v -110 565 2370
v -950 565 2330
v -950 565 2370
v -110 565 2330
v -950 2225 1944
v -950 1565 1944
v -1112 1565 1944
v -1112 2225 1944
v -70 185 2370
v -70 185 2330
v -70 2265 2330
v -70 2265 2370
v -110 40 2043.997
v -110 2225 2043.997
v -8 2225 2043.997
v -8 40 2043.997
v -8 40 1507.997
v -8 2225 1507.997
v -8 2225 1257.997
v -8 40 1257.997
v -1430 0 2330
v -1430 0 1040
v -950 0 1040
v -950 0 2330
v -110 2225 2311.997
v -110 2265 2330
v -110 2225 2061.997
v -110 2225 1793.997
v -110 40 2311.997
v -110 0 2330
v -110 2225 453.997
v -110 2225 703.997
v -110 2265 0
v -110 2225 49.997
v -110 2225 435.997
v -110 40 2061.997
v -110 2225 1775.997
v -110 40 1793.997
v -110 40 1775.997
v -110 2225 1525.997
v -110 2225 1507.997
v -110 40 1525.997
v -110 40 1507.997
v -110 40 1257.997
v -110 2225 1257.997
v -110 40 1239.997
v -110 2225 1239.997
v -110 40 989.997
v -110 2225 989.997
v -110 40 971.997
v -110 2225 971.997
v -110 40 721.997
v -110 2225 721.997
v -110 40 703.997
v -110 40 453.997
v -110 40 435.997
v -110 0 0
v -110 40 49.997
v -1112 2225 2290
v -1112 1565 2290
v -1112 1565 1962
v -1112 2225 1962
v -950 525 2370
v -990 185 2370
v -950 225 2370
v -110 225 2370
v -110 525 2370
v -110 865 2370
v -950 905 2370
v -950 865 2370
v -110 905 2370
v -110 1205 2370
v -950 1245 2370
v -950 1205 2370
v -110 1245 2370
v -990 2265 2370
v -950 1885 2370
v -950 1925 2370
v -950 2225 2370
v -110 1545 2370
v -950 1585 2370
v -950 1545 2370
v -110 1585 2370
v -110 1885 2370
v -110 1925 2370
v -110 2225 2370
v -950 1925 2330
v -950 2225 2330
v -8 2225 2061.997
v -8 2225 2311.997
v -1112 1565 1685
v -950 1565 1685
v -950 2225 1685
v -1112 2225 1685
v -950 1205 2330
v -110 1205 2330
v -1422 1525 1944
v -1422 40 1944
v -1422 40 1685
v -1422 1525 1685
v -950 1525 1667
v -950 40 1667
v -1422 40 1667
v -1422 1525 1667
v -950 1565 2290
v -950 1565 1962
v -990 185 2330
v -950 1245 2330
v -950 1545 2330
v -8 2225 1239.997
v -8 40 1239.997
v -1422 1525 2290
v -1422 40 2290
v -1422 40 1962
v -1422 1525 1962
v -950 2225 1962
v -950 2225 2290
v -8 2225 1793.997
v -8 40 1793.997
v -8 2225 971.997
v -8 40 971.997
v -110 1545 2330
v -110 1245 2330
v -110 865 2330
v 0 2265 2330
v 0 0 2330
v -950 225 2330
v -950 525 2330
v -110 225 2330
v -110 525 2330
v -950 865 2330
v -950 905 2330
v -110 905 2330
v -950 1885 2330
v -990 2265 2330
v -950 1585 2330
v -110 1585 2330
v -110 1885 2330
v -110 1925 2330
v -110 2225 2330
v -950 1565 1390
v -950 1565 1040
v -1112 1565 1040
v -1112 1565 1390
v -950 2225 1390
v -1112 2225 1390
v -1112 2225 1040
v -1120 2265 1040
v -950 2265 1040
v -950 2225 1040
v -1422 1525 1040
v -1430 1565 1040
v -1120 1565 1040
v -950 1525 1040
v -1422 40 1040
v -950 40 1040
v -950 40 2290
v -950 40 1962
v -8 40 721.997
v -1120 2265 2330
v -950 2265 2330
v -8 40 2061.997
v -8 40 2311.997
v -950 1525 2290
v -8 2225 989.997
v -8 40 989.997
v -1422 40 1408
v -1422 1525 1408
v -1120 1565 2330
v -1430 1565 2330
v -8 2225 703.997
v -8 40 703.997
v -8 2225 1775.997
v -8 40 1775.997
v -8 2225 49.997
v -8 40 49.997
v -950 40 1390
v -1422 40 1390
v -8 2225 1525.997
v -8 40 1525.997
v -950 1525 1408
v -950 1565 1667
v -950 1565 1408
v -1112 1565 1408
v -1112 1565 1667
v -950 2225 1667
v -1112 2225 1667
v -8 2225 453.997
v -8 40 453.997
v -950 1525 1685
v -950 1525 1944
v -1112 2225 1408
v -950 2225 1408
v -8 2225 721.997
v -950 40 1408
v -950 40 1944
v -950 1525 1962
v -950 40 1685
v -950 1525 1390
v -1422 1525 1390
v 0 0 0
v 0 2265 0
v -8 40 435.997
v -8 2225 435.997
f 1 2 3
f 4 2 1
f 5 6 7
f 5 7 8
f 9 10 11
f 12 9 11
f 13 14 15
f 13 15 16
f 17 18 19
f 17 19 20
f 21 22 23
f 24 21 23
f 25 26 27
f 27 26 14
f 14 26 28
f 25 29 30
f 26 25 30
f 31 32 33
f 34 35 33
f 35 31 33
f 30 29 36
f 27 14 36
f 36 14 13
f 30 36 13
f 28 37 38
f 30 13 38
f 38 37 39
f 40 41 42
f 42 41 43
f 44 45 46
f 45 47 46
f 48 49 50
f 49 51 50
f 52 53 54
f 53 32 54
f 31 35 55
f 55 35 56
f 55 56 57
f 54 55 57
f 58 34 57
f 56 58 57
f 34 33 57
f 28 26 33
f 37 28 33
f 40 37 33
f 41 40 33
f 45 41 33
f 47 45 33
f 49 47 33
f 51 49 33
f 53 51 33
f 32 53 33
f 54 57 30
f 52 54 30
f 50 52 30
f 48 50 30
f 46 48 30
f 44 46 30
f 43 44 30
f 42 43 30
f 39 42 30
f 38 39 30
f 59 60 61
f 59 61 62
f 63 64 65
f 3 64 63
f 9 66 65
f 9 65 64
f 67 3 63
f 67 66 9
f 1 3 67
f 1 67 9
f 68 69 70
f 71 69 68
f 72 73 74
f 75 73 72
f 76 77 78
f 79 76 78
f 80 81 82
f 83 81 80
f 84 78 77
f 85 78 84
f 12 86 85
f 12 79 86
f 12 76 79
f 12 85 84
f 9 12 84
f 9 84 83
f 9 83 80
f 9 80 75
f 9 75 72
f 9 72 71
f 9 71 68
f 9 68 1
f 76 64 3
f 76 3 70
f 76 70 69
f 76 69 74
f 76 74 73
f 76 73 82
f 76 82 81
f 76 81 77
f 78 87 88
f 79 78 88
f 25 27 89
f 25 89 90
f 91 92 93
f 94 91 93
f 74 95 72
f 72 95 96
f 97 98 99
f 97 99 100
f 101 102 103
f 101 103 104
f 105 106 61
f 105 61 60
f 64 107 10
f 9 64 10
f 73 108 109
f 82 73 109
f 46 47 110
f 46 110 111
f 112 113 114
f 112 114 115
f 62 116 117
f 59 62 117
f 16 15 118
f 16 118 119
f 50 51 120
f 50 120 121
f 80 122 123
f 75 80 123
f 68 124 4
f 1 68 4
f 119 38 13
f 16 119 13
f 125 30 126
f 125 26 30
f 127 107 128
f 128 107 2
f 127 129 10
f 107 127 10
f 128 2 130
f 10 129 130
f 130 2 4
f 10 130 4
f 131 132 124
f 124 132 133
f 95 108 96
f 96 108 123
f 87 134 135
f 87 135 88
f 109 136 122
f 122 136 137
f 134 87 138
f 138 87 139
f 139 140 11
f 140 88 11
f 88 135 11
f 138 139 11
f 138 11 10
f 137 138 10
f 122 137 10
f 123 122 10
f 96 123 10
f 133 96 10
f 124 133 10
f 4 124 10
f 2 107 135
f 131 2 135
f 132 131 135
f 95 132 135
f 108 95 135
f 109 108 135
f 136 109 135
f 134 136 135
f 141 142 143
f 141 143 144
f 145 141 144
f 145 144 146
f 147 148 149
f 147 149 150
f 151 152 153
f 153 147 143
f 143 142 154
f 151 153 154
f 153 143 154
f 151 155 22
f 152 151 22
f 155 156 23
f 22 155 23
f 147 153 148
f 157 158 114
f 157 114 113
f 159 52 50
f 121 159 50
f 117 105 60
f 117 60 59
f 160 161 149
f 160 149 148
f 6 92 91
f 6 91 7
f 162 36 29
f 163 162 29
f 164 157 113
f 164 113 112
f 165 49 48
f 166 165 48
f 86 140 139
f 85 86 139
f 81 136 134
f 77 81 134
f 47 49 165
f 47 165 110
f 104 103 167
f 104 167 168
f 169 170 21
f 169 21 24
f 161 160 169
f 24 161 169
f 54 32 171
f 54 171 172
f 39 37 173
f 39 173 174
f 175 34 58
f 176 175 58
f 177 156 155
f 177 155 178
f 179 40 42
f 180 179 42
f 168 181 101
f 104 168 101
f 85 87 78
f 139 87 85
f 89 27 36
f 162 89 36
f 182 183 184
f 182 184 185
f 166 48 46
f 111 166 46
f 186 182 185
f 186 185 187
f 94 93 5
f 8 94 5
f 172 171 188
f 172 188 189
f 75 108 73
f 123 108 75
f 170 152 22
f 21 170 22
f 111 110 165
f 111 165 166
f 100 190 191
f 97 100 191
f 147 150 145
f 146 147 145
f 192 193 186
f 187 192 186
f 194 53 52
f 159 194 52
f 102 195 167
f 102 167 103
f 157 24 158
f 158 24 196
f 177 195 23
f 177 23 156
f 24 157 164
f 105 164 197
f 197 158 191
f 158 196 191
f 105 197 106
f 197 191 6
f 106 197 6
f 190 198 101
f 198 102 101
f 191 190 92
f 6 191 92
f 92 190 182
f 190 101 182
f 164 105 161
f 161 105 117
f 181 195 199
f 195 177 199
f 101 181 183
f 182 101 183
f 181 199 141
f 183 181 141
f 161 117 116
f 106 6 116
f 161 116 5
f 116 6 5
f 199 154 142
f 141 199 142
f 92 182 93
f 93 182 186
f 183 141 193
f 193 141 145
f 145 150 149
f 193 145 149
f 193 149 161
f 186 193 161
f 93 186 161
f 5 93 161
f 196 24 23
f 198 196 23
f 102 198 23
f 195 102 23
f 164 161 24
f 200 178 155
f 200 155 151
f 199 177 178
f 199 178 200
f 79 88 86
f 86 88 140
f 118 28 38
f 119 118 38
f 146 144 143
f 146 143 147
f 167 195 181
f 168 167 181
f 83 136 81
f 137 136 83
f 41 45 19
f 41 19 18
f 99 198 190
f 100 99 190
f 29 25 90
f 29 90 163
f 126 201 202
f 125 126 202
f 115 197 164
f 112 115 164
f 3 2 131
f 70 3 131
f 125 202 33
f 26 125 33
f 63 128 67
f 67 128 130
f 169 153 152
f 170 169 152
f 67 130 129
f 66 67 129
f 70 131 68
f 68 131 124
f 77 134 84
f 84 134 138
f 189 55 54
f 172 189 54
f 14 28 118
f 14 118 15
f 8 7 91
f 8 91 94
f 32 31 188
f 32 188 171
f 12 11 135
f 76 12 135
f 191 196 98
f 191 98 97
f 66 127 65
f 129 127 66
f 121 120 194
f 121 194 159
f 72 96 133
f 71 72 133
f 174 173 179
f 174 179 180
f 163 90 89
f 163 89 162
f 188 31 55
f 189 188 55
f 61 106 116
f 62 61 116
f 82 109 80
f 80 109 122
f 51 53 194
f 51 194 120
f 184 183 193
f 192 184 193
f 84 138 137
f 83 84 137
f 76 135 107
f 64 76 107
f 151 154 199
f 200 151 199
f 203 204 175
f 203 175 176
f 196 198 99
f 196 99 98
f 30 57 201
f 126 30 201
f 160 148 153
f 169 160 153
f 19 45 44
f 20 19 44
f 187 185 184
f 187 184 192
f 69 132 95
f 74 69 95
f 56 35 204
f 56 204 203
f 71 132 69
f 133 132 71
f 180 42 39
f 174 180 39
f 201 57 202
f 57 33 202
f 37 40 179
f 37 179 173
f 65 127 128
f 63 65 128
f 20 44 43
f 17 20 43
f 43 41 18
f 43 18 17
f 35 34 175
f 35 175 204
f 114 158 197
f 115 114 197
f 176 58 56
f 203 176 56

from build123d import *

# Parameters (mm, degrees)
F1_DEPTH  = 2330
F2_W      = 2185
F2_H      = 250
F2_H_2    = 386
F3_DEPTH  = 102
F5_DEPTH  = 480
F6_W      = 660
F6_H      = 350
F6_H_2    = 259
F6_H_3    = 328
F7_DEPTH  = 162
F6_W_2    = 1485
F8_DEPTH  = 472
F9_W      = 840
F9_H      = 40
F10_DEPTH = 40


with BuildPart() as f1:
    # F0 (on Top) → F1 (new body)
    with BuildSketch(Plane.XY):
        Polygon((-110, 0), (0, 0), (0, 789.6427494474), (0, 2265), (-110, 2265), (-110, 789.6427494474), align=None)
    extrude(amount=F1_DEPTH)

    # F2 (on face) → F3 (cut)
    with BuildSketch(Plane(origin=(-110, 0, 0), x_dir=(0, -1, 0), z_dir=(-1, 0, 0))):
        with Locations((-1132.5, 2186.9966740608)):
            Rectangle(F2_W, F2_H)
        with Locations((-1132.5, 1918.9966740608)):
            Rectangle(F2_W, F2_H)
        with Locations((-1132.5, 1650.9966740608)):
            Rectangle(F2_W, F2_H)
        with Locations((-1132.5, 1382.9966740608)):
            Rectangle(F2_W, F2_H)
        with Locations((-1132.5, 1114.9966740608)):
            Rectangle(F2_W, F2_H)
        with Locations((-1132.5, 846.9966740608)):
            Rectangle(F2_W, F2_H)
        with Locations((-1132.5, 578.9966740608)):
            Rectangle(F2_W, F2_H)
        with Locations((-1132.5, 242.9966740608)):
            Rectangle(F2_W, F2_H_2)
    extrude(amount=-F3_DEPTH, mode=Mode.SUBTRACT)


with BuildPart() as f1b:
    # F0 (on Top) → F1, piece 2 (new body)
    with BuildSketch(Plane.XY):
        Polygon((-950, 2265), (-1120, 2265), (-1120, 1565), (-1430, 1565), (-1430, 0), (-1120, 0), (-950, 0), align=None)
    extrude(amount=F1_DEPTH)

    # F4 (on face) → F5 (cut)
    with BuildSketch(Plane.YZ.offset(-950)):
        Polygon((2265, 1040), (0, 1040), (0, 0), (1565, 0), (2265, 0), align=None)
    extrude(amount=-F5_DEPTH, mode=Mode.SUBTRACT)

    # F6 (on face) → F7 (cut)
    with BuildSketch(Plane.YZ.offset(-950)):
        with Locations((1895, 1215)):
            Rectangle(F6_W, F6_H)
        with Locations((1895, 1537.5)):
            Rectangle(F6_W, F6_H_2)
        with Locations((1895, 1814.5)):
            Rectangle(F6_W, F6_H_2)
        with Locations((1895, 2126)):
            Rectangle(F6_W, F6_H_3)
    extrude(amount=-F7_DEPTH, mode=Mode.SUBTRACT)

    # F6 (on face) → F8 (cut)
    with BuildSketch(Plane.YZ.offset(-950)):
        with Locations((782.5, 1215)):
            Rectangle(F6_W_2, F6_H)
        with Locations((782.5, 1537.5)):
            Rectangle(F6_W_2, F6_H_2)
        with Locations((782.5, 1814.5)):
            Rectangle(F6_W_2, F6_H_2)
        with Locations((782.5, 2126)):
            Rectangle(F6_W_2, F6_H_3)
    extrude(amount=-F8_DEPTH, mode=Mode.SUBTRACT)


with BuildPart() as f10:
    # F9 (on face) → F10 (new body)
    with BuildSketch(Plane.XY.offset(2330)):
        with Locations((-530, 1905)):
            Rectangle(F9_W, F9_H)
        with Locations((-530, 1565)):
            Rectangle(F9_W, F9_H)
        with Locations((-530, 1225)):
            Rectangle(F9_W, F9_H)
        with Locations((-530, 885)):
            Rectangle(F9_W, F9_H)
        with Locations((-530, 205)):
            Rectangle(F9_W, F9_H)
        with Locations((-530, 545)):
            Rectangle(F9_W, F9_H)
        Polygon((-110, 225), (-110, 185), (-70, 185), (-70, 2265), (-110, 2265), (-110, 2225), (-110, 1925), (-110, 1885), (-110, 1585), (-110, 1545), (-110, 1245), (-110, 1205), (-110, 905), (-110, 865), (-110, 565), (-110, 525), align=None)
        Polygon((-990, 185), (-950, 185), (-950, 225), (-950, 525), (-950, 565), (-950, 865), (-950, 905), (-950, 1205), (-950, 1245), (-950, 1545), (-950, 1585), (-950, 1885), (-950, 1925), (-950, 2225), (-950, 2265), (-990, 2265), align=None)
        with Locations((-530, 2245)):
            Rectangle(F9_W, F9_H)
    extrude(amount=F10_DEPTH)


solid = Compound([f1.part, f1b.part, f10.part])
